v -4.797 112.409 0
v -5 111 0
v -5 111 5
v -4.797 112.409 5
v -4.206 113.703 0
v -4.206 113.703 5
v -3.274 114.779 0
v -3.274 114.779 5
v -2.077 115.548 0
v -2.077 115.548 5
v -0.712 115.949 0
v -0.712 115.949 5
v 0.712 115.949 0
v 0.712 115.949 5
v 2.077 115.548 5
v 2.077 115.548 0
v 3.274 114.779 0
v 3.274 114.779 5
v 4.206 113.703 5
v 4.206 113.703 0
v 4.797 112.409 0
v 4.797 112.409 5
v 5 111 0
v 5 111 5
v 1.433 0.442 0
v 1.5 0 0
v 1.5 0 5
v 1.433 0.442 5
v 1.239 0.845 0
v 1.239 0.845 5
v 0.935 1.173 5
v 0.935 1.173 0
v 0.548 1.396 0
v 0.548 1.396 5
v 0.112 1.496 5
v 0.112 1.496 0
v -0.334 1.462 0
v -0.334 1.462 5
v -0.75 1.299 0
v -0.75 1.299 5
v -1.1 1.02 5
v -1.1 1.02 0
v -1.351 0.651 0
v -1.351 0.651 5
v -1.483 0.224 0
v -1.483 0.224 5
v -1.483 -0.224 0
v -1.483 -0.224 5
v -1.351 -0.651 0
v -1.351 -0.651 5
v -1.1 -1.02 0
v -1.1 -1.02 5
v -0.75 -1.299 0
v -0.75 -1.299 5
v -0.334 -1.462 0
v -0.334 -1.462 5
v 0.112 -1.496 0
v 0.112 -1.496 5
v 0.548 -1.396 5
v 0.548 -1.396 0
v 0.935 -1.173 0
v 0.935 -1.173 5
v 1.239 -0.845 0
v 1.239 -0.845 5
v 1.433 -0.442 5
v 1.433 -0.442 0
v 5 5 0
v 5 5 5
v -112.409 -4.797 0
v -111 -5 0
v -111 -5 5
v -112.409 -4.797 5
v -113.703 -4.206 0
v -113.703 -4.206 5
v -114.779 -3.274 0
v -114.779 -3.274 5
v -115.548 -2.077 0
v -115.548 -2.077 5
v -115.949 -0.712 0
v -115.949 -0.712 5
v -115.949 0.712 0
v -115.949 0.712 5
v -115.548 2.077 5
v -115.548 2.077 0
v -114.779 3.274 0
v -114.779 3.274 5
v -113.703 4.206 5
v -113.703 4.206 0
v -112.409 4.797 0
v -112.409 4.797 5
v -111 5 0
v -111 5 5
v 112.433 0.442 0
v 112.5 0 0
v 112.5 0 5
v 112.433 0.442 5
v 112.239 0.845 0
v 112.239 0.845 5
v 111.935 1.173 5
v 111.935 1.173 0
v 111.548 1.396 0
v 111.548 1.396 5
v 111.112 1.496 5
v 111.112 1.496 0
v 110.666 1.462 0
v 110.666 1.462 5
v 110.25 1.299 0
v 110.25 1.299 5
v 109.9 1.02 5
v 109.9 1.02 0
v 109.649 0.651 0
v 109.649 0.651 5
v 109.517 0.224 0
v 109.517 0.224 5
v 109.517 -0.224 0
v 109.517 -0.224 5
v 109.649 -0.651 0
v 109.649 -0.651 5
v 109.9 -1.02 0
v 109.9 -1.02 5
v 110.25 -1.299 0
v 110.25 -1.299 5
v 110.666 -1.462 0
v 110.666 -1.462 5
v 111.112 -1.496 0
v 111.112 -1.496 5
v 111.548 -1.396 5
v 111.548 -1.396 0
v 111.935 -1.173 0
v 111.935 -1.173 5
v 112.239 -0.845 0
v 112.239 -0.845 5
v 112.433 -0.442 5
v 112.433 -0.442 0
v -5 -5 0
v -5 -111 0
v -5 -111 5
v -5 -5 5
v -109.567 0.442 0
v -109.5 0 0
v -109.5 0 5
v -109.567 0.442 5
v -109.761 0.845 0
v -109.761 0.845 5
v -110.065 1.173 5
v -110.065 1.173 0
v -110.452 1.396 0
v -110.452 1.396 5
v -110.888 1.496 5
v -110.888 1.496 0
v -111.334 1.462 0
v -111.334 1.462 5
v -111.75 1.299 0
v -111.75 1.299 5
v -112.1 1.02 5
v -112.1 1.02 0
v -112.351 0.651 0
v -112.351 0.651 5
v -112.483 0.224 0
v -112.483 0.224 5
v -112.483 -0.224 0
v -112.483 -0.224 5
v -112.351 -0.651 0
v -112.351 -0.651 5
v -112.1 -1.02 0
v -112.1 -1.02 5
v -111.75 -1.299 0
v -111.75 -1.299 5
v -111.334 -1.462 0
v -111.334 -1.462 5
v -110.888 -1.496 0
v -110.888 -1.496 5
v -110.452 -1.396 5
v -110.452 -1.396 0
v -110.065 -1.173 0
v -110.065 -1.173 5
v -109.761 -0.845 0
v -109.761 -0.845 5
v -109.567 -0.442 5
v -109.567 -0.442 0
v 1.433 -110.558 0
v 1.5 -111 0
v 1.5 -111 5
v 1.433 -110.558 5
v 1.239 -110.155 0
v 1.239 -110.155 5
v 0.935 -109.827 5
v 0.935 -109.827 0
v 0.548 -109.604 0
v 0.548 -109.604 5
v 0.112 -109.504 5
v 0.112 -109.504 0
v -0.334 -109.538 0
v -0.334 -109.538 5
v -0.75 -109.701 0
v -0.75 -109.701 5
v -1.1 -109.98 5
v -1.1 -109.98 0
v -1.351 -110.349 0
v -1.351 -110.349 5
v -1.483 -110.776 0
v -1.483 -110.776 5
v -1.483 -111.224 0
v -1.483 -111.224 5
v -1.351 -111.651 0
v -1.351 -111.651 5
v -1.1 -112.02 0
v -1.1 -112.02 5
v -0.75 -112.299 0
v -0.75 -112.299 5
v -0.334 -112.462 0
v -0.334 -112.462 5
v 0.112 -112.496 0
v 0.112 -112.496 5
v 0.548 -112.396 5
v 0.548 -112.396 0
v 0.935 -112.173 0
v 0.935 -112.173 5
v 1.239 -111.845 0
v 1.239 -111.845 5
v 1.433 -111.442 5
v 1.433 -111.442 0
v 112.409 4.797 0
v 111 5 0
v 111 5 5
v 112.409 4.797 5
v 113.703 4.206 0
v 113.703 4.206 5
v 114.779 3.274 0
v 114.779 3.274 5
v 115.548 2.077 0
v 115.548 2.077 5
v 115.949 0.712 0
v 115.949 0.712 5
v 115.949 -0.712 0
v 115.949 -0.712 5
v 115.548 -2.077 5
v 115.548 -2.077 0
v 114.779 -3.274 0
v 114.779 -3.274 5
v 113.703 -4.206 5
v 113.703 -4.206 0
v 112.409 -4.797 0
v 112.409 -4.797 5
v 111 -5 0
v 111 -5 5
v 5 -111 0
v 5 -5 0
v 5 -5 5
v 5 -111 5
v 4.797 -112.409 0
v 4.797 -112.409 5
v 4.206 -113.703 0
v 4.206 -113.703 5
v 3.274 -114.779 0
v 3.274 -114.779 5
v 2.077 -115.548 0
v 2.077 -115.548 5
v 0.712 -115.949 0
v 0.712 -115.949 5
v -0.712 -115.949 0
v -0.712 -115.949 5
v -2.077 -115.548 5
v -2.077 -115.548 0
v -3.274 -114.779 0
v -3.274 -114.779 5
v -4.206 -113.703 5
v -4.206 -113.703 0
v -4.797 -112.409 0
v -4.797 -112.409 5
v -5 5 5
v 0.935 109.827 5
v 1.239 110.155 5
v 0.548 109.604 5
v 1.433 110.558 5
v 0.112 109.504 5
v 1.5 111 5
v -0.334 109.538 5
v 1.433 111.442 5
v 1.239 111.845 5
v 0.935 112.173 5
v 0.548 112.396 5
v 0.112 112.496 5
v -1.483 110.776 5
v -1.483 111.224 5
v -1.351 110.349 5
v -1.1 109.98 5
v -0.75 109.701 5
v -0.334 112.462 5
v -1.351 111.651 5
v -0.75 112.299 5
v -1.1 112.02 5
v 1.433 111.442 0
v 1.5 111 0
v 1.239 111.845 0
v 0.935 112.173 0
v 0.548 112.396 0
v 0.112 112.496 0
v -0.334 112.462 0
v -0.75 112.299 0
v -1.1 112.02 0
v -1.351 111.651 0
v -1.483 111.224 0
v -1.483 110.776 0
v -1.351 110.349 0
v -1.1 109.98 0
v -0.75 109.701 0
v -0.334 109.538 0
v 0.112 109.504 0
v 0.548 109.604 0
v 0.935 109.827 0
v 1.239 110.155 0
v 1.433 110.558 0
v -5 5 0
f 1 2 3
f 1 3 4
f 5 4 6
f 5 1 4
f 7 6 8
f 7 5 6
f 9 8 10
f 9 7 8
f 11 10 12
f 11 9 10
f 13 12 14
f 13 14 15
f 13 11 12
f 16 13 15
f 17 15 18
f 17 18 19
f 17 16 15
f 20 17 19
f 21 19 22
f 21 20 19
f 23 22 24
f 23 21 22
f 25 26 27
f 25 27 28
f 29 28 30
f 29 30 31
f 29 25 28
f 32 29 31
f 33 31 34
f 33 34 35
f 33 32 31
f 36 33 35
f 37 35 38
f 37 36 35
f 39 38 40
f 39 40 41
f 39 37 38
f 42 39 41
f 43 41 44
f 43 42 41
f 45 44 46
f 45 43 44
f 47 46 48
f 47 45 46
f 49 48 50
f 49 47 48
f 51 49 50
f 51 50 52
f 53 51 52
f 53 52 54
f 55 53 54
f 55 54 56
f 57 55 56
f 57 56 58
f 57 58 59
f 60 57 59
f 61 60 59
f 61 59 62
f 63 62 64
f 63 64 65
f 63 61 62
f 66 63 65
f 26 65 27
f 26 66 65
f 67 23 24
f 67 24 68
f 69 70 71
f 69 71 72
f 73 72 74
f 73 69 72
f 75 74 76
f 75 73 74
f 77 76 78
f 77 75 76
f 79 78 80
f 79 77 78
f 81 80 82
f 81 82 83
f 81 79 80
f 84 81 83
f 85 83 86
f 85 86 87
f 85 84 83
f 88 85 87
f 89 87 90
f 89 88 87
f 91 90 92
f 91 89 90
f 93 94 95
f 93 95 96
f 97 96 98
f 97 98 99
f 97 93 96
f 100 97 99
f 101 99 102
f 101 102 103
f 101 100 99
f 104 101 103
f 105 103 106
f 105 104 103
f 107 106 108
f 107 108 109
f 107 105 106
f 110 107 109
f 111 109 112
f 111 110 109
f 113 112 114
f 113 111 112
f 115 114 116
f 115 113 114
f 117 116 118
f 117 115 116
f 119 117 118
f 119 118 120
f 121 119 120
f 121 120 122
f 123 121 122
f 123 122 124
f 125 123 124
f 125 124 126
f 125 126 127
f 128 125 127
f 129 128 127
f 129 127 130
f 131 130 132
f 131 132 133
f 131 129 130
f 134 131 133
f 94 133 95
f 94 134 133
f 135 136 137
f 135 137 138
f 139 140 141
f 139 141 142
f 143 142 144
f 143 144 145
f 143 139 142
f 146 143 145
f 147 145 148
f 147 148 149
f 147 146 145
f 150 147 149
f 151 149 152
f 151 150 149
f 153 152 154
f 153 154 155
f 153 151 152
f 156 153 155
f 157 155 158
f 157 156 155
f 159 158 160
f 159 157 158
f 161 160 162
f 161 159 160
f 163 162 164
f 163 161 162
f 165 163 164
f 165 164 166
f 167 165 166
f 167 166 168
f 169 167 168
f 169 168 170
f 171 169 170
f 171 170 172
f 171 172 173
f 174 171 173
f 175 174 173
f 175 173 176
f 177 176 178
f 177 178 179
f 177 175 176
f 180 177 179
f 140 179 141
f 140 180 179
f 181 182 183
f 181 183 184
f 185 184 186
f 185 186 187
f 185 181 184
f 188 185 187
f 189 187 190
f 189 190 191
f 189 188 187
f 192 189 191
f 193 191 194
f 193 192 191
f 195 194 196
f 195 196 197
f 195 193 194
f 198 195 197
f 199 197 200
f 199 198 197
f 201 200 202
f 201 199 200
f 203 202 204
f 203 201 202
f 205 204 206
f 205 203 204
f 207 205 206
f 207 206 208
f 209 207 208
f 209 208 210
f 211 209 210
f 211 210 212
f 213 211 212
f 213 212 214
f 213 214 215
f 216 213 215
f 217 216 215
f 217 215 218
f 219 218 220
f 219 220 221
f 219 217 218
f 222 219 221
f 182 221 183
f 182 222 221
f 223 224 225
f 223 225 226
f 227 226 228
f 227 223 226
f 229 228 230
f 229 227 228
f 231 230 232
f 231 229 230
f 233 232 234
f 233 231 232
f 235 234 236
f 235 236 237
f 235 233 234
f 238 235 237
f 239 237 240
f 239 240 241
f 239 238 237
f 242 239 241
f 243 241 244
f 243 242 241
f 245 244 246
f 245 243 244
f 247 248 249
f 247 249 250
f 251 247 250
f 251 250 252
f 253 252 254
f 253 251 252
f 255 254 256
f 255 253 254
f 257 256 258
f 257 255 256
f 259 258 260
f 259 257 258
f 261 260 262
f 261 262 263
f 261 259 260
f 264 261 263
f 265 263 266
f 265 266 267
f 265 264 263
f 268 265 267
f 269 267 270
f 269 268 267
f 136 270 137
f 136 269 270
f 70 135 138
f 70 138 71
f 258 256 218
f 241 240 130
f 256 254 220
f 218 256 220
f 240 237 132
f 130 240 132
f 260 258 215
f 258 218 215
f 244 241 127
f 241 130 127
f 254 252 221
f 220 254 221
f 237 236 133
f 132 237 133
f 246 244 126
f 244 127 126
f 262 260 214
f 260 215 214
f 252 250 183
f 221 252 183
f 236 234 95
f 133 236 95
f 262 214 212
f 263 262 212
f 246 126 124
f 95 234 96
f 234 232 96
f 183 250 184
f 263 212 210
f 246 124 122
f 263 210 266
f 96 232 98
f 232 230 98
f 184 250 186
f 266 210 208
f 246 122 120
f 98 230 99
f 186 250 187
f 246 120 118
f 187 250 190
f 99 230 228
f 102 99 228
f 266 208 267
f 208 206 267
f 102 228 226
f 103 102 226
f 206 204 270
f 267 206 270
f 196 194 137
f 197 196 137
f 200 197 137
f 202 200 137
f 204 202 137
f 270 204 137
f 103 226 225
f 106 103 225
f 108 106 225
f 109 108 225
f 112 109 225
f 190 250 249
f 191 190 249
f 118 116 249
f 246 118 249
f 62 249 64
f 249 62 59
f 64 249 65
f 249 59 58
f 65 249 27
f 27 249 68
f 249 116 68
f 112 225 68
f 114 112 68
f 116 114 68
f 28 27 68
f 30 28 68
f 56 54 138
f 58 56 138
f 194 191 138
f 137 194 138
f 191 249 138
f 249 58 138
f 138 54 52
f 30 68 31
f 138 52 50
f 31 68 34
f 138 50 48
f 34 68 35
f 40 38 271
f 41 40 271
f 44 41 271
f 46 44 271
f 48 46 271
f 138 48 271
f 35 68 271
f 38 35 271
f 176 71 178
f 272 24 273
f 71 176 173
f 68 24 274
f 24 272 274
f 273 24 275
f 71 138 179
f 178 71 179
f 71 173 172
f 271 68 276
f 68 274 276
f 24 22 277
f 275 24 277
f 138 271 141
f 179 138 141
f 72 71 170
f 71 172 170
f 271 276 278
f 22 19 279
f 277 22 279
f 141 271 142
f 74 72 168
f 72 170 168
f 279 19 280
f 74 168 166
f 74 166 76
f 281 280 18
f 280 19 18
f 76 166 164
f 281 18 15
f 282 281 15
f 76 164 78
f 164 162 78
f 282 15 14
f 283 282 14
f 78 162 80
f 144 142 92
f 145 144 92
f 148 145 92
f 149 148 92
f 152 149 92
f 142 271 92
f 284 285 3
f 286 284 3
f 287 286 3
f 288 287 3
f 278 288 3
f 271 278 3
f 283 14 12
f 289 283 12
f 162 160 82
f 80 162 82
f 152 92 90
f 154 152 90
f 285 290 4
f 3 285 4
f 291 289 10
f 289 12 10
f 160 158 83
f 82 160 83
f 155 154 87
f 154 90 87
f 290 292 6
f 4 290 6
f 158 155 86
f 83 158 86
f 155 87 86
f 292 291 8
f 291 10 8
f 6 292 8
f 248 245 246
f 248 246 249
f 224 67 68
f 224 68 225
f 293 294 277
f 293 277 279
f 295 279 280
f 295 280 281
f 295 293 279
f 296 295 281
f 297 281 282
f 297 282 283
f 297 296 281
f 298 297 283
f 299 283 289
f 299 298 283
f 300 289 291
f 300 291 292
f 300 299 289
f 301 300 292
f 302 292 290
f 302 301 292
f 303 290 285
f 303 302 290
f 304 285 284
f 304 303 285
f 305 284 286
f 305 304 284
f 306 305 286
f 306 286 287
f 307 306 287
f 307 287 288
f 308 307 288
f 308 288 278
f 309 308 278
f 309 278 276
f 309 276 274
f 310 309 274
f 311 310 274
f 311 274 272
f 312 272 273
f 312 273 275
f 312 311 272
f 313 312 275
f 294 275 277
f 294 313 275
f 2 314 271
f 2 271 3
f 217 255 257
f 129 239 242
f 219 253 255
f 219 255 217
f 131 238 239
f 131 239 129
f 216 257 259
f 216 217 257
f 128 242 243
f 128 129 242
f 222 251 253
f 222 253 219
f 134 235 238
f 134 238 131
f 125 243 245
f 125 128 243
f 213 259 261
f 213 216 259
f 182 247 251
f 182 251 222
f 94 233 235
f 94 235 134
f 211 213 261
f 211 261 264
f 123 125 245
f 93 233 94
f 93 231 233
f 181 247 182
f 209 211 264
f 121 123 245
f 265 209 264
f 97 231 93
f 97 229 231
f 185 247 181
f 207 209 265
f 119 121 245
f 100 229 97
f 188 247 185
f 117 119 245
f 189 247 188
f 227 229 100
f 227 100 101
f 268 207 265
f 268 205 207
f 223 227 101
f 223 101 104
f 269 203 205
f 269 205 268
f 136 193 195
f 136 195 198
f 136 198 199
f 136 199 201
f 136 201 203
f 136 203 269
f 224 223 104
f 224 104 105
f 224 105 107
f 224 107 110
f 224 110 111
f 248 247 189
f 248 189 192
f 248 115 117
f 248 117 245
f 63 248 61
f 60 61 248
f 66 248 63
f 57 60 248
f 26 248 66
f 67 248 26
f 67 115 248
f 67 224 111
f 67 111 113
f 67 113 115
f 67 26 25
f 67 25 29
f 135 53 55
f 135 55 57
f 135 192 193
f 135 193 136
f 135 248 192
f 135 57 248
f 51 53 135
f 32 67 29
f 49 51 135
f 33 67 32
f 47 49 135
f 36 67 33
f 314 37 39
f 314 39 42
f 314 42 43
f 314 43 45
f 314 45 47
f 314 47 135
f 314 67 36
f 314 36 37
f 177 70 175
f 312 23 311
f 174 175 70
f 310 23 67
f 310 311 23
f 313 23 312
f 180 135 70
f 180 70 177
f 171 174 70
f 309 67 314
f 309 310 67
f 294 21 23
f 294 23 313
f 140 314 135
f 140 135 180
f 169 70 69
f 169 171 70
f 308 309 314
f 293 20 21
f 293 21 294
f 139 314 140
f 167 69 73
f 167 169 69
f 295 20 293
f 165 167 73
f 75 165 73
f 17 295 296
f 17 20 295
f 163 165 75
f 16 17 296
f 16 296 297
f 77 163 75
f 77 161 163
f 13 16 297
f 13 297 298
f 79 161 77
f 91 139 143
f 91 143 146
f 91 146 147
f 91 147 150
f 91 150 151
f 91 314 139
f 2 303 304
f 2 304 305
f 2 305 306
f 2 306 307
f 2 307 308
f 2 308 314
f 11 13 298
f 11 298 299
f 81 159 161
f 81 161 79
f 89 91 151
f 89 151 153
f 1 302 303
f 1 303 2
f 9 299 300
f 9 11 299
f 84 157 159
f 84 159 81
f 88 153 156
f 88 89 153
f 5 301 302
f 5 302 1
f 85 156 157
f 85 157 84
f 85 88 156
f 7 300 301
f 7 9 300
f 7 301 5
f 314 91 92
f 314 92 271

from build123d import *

# Parameters (mm, degrees)
SKETCH1_R           = 1.5
BOSS_EXTRUDE1_DEPTH = 5


with BuildPart() as part:
    # Sketch1 → Boss-Extrude1 (new body)
    with BuildSketch(Plane.XY):
        with BuildLine():
            Line((5, -5), (5, -111))
            ThreePointArc((5, -111), (0, -116), (-5, -111))
            Line((-5, -111), (-5, -5))
            Line((-5, -5), (-111, -5))
            ThreePointArc((-111, -5), (-116, 0), (-111, 5))
            Line((-111, 5), (-5, 5))
            Line((-5, 5), (-5, 111))
            ThreePointArc((-5, 111), (0, 116), (5, 111))
            Line((5, 111), (5, 5))
            Line((5, 5), (111, 5))
            ThreePointArc((111, 5), (116, 0), (111, -5))
            Line((111, -5), (5, -5))
        make_face()
        Circle(SKETCH1_R, mode=Mode.SUBTRACT)
        with Locations((0, -111)):
            Circle(SKETCH1_R, mode=Mode.SUBTRACT)
        with Locations((-111, 0)):
            Circle(SKETCH1_R, mode=Mode.SUBTRACT)
        with Locations((0, 111)):
            Circle(SKETCH1_R, mode=Mode.SUBTRACT)
        with Locations((111, 0)):
            Circle(SKETCH1_R, mode=Mode.SUBTRACT)
    extrude(amount=BOSS_EXTRUDE1_DEPTH)


solid = part.part
